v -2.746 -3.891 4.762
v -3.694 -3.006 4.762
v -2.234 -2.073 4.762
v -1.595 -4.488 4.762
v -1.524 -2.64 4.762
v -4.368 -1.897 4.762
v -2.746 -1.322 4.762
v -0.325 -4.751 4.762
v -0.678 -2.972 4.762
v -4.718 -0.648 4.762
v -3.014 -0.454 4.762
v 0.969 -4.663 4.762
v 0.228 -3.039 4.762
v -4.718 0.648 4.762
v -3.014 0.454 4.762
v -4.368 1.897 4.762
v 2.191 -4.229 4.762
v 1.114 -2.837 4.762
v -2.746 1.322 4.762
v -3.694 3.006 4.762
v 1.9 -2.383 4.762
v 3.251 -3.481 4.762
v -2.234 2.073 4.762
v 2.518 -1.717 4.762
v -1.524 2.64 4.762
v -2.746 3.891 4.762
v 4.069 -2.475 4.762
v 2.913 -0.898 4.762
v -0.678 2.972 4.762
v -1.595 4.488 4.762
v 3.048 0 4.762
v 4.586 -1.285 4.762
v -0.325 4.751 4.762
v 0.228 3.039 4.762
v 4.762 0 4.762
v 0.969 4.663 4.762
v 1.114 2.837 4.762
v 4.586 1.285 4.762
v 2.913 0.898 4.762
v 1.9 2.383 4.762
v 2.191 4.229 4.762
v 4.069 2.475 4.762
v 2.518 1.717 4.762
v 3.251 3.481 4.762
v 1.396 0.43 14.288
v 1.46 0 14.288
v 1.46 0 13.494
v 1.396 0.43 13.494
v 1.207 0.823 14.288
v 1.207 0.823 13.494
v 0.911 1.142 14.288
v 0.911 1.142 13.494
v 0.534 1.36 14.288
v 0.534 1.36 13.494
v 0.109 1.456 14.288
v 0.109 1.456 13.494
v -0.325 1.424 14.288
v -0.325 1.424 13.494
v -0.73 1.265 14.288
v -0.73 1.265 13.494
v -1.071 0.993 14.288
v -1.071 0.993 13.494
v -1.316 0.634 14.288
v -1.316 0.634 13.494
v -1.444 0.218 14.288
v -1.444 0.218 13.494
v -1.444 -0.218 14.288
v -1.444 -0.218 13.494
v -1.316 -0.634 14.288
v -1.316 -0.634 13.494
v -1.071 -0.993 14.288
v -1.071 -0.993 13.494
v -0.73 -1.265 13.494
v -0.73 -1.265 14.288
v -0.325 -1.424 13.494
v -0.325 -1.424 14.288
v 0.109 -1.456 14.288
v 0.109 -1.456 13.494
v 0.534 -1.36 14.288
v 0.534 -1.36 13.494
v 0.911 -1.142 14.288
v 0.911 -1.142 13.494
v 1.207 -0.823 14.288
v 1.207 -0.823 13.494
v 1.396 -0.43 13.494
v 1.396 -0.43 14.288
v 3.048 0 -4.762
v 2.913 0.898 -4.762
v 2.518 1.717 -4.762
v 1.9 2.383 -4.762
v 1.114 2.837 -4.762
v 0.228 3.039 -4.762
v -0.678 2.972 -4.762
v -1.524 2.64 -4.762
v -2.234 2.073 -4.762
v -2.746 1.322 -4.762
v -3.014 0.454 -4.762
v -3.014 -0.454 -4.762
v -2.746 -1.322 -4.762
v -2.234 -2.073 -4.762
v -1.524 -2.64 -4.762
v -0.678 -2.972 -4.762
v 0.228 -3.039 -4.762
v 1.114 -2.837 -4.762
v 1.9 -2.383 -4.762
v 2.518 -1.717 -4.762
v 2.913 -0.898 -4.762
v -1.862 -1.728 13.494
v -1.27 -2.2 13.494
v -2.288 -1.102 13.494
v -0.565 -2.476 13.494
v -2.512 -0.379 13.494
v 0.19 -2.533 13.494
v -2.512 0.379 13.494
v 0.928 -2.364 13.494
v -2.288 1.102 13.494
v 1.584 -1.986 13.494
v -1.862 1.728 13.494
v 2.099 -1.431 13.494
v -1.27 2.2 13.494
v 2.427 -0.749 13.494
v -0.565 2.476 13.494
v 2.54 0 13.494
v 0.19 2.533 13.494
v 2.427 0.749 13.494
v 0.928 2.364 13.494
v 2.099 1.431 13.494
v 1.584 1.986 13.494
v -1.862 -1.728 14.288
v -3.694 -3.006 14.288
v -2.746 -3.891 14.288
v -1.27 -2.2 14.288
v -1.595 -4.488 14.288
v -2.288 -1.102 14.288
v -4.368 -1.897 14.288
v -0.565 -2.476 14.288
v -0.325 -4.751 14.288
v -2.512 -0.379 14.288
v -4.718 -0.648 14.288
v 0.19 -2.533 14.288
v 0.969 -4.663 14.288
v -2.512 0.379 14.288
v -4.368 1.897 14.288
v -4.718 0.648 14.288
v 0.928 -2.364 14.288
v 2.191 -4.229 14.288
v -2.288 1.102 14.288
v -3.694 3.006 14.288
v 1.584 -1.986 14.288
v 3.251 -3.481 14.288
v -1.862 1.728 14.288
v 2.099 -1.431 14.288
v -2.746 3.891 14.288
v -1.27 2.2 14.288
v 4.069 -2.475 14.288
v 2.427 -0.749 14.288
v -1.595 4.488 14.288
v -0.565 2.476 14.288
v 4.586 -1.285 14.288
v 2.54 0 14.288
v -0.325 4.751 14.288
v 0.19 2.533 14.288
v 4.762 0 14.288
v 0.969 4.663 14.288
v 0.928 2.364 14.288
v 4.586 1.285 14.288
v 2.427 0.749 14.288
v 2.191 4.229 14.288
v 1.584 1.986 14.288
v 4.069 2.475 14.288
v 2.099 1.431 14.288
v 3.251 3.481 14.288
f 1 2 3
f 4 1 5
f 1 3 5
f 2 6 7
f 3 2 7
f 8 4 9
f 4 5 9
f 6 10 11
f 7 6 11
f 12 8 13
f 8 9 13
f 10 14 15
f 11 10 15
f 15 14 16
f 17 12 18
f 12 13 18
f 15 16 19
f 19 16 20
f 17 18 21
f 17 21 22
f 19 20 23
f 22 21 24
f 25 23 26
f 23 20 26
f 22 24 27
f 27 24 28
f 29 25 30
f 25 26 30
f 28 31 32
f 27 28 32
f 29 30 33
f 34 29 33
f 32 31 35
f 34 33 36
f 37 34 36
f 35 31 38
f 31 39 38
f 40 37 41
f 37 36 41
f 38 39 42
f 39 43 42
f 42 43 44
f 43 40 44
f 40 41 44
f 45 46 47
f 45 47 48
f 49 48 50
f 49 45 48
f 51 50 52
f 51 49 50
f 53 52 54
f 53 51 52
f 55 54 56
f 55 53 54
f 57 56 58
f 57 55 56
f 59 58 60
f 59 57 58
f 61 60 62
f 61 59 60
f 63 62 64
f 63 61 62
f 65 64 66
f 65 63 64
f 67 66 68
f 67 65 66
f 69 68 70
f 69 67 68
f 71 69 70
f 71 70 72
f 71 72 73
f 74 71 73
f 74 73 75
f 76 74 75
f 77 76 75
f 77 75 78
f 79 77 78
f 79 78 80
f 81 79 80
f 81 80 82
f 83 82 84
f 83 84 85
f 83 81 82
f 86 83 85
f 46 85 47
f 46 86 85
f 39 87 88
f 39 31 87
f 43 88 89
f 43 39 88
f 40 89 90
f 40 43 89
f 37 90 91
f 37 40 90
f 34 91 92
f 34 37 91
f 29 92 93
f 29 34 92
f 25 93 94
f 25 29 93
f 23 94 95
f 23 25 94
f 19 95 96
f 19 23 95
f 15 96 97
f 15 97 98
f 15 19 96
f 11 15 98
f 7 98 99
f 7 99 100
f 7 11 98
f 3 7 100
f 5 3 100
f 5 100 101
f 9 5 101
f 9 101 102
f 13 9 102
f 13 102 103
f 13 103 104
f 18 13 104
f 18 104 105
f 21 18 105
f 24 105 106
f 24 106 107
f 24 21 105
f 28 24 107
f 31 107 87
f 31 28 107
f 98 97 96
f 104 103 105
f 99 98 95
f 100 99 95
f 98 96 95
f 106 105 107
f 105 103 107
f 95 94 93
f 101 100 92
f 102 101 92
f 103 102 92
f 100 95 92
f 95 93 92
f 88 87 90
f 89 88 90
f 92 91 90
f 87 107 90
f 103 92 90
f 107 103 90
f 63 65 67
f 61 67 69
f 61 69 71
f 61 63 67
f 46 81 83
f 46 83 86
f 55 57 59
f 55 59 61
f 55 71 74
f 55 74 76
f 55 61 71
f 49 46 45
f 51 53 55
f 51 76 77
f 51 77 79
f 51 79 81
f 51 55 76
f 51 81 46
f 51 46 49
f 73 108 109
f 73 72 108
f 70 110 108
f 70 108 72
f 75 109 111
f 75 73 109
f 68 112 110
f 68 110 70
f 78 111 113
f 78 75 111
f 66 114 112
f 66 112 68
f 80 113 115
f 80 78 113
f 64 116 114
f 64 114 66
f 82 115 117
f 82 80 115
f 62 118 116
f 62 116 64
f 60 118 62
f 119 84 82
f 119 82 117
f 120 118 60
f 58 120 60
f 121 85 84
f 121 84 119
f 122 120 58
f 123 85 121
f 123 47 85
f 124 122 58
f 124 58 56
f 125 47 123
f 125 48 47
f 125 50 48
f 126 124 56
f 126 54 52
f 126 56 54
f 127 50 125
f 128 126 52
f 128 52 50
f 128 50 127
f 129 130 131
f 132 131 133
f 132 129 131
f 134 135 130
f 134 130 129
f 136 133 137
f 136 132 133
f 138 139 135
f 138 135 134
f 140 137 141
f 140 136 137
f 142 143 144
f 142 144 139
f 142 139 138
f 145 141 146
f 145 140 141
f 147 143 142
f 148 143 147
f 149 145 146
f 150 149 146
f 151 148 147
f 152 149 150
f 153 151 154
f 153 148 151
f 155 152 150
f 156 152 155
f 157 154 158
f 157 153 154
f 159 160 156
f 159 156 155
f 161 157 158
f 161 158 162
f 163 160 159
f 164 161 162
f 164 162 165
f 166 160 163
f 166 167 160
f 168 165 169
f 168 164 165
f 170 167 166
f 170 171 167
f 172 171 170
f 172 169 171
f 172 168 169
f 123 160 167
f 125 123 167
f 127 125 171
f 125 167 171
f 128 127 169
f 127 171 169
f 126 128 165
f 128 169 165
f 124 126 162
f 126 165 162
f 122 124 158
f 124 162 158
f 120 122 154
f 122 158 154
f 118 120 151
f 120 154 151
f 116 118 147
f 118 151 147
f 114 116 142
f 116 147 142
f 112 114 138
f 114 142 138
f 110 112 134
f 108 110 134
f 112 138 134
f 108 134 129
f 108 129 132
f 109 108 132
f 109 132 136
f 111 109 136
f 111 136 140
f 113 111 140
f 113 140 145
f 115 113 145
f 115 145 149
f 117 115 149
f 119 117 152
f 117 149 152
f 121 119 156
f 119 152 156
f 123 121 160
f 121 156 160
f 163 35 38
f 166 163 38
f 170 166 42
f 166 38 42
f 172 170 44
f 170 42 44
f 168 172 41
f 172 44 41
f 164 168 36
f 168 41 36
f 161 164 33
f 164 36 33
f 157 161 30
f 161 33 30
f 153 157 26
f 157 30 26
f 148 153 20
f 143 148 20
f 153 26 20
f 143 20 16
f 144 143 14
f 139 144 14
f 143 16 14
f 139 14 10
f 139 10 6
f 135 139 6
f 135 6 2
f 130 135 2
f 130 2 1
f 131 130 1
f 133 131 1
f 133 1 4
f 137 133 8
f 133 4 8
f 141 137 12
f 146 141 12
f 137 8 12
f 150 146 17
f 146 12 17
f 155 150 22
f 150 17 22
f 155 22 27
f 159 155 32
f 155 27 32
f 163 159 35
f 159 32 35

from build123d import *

# Parameters (mm, degrees)
F0_R     = 3.048
F1_DEPTH = 4.7625
F2_R     = 4.7625
F3_DEPTH = 9.525
F4_R     = 2.54
F4_R_2   = 1.4605
F5_DEPTH = 0.79375


# Not quite as in the source:
# - a length typed as a fraction of an inch, garbled in the dataset ("3 / 203.2 mm" for 3/8 in), is restored


with BuildPart() as f1:
    # F0 (on Top) → F1 (new body, symmetric)
    with BuildSketch(Plane.XY):
        Circle(F0_R)
    extrude(amount=F1_DEPTH, both=True)

    # F2 (on face) → F3 (join)
    with BuildSketch(Plane.XY.offset(4.7625)):
        Circle(F2_R)
    extrude(amount=F3_DEPTH)

    # F4 (on face) → F5 (cut)
    with BuildSketch(Plane.XY.offset(14.2875)):
        Circle(F4_R)
        Circle(F4_R_2, mode=Mode.SUBTRACT)
    extrude(amount=-F5_DEPTH, mode=Mode.SUBTRACT)


solid = f1.part
